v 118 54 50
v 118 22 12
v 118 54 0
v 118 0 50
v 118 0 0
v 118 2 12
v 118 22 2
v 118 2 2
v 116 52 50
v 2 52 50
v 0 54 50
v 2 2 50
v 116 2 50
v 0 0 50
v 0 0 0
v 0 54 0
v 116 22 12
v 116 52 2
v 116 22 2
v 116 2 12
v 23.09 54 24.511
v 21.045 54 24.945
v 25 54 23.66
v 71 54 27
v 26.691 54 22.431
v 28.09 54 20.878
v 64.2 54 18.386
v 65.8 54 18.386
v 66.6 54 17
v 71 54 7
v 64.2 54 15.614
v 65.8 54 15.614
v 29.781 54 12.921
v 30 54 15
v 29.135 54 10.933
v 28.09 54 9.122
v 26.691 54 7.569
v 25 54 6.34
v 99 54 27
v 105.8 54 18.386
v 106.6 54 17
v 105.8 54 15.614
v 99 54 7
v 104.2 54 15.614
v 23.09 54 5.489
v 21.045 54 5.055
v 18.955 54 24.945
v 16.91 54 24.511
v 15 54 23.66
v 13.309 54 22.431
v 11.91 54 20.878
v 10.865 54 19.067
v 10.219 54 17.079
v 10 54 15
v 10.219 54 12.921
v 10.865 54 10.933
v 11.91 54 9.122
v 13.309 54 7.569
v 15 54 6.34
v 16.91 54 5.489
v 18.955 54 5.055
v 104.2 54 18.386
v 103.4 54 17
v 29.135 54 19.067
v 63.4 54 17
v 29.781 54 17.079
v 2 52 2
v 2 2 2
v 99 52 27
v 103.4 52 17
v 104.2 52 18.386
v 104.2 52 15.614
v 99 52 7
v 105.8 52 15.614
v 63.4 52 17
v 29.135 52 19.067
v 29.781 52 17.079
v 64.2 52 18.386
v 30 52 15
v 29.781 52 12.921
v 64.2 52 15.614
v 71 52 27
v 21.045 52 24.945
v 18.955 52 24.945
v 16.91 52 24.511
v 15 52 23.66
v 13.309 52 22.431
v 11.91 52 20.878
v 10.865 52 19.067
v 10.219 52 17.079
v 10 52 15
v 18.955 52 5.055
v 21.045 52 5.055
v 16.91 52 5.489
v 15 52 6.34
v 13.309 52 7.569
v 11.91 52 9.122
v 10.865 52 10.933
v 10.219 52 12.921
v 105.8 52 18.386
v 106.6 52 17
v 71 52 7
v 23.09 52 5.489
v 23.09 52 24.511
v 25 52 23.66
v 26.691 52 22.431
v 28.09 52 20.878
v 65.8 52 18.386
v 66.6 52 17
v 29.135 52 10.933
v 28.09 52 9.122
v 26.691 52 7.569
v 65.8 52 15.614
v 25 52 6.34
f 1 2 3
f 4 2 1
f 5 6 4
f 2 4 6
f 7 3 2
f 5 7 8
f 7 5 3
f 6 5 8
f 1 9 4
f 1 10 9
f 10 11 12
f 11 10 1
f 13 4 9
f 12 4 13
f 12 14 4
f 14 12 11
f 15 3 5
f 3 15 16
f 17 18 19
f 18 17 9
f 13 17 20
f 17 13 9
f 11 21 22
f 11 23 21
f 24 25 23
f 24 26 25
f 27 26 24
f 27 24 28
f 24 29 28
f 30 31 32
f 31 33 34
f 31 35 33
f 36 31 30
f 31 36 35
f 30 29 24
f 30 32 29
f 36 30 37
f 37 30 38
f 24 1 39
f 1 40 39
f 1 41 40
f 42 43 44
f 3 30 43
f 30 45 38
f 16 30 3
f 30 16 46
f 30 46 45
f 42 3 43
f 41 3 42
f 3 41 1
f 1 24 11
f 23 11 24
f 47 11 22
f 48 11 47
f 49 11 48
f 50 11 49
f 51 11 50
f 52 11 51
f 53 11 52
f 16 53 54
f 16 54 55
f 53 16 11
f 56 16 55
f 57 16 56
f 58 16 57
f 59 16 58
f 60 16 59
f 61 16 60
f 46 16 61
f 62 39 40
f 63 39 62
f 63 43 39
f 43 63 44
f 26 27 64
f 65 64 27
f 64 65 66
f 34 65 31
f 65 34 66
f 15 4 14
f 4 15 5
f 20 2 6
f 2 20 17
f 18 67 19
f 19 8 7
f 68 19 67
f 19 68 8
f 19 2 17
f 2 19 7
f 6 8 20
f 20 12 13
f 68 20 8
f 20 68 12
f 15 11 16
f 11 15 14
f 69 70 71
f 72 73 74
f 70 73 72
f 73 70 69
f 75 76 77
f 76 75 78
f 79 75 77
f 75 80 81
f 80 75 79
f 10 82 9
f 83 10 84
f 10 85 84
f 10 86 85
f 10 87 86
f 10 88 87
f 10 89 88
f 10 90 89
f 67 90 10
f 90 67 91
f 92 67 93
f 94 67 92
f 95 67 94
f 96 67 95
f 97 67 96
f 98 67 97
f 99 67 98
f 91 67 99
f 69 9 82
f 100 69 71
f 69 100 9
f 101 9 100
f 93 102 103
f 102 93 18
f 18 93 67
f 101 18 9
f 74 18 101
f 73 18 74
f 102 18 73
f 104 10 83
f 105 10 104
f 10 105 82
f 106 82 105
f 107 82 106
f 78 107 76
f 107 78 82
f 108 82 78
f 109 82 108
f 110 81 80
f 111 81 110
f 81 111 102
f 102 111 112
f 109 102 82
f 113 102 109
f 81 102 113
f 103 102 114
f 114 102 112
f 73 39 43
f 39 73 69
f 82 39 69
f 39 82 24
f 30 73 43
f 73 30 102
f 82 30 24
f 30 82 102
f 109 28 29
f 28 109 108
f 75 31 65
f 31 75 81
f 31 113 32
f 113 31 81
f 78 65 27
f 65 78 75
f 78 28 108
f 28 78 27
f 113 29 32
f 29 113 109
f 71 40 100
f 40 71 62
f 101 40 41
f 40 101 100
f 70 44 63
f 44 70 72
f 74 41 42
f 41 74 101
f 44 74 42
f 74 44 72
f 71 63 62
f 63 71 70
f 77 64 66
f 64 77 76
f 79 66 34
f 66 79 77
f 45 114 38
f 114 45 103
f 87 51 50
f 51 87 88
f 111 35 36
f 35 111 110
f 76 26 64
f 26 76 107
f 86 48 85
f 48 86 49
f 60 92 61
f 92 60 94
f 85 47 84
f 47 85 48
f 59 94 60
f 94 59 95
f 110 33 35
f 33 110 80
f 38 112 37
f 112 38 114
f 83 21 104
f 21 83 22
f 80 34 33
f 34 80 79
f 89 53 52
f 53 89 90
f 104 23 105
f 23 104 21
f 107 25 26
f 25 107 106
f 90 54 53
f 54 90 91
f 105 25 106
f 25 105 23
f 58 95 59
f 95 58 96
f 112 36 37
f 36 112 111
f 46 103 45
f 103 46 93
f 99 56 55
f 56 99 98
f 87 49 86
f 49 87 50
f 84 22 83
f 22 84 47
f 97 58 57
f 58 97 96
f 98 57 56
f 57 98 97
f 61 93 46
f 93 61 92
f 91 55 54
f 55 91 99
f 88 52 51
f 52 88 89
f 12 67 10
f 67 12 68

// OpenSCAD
Case_Width = 114;
Case_Height = 50;
Case_Depth = 50;
Case_thickness = 2;

Connector_Width = 28;
Connector_Height = 20;
Connector_Position = 7;
Connector_Screw_Distance = 5;


Button_Radius = 10; 
Button_Distance = 15;

Wire_Hole_Height = 10;
Wire_Hole_Width = 20;

cube([Case_Width + (Case_thickness * 2),Case_Depth + (Case_thickness * 2), Case_thickness]);
cube([Case_thickness,Case_Depth + (Case_thickness * 2),Case_Height]);
cube([Case_Width + (Case_thickness * 2), Case_thickness, Case_Height]);
difference(){
	translate([Case_Width + Case_thickness, 0,0]) cube([Case_thickness, Case_Depth + (Case_thickness * 2), Case_Height]);
	translate([Case_Width - 3 ,Case_thickness,Case_thickness])	cube([10,Wire_Hole_Width,Wire_Hole_Height]);
}
difference() {
	translate ([0,Case_Depth + Case_thickness,0]) cube([Case_Width + Case_thickness,Case_thickness,Case_Height]);
	
	//Conector
	translate([Case_Width - Connector_Width - 15, Case_Depth - 1 , Connector_Position])     	cube([Connector_Width, (Case_thickness * 2) + 2,Connector_Height]);
	// Parafusos conector
	rotate(90, [1,0,0]) translate([Case_Width - Connector_Width - Button_Distance - 6, Button_Distance + 2 , -Case_Depth - (Case_thickness * 3) - 1])  cylinder(h = (Case_thickness * 4) + 2, r=1.6);
	rotate(90, [1,0,0]) translate([Case_Width - Connector_Width + Button_Distance + 4, Button_Distance + 2, -Case_Depth - (Case_thickness * 3) - 1])  cylinder(h = (Case_thickness * 4) + 2, r=1.6);


	// Botão
	rotate(90, [1,0,0]) translate([20, Button_Distance , -Case_Depth - (Case_thickness * 2) - 1]) cylinder(h = (Case_thickness * 2) + 2, r=Button_Radius);
}
